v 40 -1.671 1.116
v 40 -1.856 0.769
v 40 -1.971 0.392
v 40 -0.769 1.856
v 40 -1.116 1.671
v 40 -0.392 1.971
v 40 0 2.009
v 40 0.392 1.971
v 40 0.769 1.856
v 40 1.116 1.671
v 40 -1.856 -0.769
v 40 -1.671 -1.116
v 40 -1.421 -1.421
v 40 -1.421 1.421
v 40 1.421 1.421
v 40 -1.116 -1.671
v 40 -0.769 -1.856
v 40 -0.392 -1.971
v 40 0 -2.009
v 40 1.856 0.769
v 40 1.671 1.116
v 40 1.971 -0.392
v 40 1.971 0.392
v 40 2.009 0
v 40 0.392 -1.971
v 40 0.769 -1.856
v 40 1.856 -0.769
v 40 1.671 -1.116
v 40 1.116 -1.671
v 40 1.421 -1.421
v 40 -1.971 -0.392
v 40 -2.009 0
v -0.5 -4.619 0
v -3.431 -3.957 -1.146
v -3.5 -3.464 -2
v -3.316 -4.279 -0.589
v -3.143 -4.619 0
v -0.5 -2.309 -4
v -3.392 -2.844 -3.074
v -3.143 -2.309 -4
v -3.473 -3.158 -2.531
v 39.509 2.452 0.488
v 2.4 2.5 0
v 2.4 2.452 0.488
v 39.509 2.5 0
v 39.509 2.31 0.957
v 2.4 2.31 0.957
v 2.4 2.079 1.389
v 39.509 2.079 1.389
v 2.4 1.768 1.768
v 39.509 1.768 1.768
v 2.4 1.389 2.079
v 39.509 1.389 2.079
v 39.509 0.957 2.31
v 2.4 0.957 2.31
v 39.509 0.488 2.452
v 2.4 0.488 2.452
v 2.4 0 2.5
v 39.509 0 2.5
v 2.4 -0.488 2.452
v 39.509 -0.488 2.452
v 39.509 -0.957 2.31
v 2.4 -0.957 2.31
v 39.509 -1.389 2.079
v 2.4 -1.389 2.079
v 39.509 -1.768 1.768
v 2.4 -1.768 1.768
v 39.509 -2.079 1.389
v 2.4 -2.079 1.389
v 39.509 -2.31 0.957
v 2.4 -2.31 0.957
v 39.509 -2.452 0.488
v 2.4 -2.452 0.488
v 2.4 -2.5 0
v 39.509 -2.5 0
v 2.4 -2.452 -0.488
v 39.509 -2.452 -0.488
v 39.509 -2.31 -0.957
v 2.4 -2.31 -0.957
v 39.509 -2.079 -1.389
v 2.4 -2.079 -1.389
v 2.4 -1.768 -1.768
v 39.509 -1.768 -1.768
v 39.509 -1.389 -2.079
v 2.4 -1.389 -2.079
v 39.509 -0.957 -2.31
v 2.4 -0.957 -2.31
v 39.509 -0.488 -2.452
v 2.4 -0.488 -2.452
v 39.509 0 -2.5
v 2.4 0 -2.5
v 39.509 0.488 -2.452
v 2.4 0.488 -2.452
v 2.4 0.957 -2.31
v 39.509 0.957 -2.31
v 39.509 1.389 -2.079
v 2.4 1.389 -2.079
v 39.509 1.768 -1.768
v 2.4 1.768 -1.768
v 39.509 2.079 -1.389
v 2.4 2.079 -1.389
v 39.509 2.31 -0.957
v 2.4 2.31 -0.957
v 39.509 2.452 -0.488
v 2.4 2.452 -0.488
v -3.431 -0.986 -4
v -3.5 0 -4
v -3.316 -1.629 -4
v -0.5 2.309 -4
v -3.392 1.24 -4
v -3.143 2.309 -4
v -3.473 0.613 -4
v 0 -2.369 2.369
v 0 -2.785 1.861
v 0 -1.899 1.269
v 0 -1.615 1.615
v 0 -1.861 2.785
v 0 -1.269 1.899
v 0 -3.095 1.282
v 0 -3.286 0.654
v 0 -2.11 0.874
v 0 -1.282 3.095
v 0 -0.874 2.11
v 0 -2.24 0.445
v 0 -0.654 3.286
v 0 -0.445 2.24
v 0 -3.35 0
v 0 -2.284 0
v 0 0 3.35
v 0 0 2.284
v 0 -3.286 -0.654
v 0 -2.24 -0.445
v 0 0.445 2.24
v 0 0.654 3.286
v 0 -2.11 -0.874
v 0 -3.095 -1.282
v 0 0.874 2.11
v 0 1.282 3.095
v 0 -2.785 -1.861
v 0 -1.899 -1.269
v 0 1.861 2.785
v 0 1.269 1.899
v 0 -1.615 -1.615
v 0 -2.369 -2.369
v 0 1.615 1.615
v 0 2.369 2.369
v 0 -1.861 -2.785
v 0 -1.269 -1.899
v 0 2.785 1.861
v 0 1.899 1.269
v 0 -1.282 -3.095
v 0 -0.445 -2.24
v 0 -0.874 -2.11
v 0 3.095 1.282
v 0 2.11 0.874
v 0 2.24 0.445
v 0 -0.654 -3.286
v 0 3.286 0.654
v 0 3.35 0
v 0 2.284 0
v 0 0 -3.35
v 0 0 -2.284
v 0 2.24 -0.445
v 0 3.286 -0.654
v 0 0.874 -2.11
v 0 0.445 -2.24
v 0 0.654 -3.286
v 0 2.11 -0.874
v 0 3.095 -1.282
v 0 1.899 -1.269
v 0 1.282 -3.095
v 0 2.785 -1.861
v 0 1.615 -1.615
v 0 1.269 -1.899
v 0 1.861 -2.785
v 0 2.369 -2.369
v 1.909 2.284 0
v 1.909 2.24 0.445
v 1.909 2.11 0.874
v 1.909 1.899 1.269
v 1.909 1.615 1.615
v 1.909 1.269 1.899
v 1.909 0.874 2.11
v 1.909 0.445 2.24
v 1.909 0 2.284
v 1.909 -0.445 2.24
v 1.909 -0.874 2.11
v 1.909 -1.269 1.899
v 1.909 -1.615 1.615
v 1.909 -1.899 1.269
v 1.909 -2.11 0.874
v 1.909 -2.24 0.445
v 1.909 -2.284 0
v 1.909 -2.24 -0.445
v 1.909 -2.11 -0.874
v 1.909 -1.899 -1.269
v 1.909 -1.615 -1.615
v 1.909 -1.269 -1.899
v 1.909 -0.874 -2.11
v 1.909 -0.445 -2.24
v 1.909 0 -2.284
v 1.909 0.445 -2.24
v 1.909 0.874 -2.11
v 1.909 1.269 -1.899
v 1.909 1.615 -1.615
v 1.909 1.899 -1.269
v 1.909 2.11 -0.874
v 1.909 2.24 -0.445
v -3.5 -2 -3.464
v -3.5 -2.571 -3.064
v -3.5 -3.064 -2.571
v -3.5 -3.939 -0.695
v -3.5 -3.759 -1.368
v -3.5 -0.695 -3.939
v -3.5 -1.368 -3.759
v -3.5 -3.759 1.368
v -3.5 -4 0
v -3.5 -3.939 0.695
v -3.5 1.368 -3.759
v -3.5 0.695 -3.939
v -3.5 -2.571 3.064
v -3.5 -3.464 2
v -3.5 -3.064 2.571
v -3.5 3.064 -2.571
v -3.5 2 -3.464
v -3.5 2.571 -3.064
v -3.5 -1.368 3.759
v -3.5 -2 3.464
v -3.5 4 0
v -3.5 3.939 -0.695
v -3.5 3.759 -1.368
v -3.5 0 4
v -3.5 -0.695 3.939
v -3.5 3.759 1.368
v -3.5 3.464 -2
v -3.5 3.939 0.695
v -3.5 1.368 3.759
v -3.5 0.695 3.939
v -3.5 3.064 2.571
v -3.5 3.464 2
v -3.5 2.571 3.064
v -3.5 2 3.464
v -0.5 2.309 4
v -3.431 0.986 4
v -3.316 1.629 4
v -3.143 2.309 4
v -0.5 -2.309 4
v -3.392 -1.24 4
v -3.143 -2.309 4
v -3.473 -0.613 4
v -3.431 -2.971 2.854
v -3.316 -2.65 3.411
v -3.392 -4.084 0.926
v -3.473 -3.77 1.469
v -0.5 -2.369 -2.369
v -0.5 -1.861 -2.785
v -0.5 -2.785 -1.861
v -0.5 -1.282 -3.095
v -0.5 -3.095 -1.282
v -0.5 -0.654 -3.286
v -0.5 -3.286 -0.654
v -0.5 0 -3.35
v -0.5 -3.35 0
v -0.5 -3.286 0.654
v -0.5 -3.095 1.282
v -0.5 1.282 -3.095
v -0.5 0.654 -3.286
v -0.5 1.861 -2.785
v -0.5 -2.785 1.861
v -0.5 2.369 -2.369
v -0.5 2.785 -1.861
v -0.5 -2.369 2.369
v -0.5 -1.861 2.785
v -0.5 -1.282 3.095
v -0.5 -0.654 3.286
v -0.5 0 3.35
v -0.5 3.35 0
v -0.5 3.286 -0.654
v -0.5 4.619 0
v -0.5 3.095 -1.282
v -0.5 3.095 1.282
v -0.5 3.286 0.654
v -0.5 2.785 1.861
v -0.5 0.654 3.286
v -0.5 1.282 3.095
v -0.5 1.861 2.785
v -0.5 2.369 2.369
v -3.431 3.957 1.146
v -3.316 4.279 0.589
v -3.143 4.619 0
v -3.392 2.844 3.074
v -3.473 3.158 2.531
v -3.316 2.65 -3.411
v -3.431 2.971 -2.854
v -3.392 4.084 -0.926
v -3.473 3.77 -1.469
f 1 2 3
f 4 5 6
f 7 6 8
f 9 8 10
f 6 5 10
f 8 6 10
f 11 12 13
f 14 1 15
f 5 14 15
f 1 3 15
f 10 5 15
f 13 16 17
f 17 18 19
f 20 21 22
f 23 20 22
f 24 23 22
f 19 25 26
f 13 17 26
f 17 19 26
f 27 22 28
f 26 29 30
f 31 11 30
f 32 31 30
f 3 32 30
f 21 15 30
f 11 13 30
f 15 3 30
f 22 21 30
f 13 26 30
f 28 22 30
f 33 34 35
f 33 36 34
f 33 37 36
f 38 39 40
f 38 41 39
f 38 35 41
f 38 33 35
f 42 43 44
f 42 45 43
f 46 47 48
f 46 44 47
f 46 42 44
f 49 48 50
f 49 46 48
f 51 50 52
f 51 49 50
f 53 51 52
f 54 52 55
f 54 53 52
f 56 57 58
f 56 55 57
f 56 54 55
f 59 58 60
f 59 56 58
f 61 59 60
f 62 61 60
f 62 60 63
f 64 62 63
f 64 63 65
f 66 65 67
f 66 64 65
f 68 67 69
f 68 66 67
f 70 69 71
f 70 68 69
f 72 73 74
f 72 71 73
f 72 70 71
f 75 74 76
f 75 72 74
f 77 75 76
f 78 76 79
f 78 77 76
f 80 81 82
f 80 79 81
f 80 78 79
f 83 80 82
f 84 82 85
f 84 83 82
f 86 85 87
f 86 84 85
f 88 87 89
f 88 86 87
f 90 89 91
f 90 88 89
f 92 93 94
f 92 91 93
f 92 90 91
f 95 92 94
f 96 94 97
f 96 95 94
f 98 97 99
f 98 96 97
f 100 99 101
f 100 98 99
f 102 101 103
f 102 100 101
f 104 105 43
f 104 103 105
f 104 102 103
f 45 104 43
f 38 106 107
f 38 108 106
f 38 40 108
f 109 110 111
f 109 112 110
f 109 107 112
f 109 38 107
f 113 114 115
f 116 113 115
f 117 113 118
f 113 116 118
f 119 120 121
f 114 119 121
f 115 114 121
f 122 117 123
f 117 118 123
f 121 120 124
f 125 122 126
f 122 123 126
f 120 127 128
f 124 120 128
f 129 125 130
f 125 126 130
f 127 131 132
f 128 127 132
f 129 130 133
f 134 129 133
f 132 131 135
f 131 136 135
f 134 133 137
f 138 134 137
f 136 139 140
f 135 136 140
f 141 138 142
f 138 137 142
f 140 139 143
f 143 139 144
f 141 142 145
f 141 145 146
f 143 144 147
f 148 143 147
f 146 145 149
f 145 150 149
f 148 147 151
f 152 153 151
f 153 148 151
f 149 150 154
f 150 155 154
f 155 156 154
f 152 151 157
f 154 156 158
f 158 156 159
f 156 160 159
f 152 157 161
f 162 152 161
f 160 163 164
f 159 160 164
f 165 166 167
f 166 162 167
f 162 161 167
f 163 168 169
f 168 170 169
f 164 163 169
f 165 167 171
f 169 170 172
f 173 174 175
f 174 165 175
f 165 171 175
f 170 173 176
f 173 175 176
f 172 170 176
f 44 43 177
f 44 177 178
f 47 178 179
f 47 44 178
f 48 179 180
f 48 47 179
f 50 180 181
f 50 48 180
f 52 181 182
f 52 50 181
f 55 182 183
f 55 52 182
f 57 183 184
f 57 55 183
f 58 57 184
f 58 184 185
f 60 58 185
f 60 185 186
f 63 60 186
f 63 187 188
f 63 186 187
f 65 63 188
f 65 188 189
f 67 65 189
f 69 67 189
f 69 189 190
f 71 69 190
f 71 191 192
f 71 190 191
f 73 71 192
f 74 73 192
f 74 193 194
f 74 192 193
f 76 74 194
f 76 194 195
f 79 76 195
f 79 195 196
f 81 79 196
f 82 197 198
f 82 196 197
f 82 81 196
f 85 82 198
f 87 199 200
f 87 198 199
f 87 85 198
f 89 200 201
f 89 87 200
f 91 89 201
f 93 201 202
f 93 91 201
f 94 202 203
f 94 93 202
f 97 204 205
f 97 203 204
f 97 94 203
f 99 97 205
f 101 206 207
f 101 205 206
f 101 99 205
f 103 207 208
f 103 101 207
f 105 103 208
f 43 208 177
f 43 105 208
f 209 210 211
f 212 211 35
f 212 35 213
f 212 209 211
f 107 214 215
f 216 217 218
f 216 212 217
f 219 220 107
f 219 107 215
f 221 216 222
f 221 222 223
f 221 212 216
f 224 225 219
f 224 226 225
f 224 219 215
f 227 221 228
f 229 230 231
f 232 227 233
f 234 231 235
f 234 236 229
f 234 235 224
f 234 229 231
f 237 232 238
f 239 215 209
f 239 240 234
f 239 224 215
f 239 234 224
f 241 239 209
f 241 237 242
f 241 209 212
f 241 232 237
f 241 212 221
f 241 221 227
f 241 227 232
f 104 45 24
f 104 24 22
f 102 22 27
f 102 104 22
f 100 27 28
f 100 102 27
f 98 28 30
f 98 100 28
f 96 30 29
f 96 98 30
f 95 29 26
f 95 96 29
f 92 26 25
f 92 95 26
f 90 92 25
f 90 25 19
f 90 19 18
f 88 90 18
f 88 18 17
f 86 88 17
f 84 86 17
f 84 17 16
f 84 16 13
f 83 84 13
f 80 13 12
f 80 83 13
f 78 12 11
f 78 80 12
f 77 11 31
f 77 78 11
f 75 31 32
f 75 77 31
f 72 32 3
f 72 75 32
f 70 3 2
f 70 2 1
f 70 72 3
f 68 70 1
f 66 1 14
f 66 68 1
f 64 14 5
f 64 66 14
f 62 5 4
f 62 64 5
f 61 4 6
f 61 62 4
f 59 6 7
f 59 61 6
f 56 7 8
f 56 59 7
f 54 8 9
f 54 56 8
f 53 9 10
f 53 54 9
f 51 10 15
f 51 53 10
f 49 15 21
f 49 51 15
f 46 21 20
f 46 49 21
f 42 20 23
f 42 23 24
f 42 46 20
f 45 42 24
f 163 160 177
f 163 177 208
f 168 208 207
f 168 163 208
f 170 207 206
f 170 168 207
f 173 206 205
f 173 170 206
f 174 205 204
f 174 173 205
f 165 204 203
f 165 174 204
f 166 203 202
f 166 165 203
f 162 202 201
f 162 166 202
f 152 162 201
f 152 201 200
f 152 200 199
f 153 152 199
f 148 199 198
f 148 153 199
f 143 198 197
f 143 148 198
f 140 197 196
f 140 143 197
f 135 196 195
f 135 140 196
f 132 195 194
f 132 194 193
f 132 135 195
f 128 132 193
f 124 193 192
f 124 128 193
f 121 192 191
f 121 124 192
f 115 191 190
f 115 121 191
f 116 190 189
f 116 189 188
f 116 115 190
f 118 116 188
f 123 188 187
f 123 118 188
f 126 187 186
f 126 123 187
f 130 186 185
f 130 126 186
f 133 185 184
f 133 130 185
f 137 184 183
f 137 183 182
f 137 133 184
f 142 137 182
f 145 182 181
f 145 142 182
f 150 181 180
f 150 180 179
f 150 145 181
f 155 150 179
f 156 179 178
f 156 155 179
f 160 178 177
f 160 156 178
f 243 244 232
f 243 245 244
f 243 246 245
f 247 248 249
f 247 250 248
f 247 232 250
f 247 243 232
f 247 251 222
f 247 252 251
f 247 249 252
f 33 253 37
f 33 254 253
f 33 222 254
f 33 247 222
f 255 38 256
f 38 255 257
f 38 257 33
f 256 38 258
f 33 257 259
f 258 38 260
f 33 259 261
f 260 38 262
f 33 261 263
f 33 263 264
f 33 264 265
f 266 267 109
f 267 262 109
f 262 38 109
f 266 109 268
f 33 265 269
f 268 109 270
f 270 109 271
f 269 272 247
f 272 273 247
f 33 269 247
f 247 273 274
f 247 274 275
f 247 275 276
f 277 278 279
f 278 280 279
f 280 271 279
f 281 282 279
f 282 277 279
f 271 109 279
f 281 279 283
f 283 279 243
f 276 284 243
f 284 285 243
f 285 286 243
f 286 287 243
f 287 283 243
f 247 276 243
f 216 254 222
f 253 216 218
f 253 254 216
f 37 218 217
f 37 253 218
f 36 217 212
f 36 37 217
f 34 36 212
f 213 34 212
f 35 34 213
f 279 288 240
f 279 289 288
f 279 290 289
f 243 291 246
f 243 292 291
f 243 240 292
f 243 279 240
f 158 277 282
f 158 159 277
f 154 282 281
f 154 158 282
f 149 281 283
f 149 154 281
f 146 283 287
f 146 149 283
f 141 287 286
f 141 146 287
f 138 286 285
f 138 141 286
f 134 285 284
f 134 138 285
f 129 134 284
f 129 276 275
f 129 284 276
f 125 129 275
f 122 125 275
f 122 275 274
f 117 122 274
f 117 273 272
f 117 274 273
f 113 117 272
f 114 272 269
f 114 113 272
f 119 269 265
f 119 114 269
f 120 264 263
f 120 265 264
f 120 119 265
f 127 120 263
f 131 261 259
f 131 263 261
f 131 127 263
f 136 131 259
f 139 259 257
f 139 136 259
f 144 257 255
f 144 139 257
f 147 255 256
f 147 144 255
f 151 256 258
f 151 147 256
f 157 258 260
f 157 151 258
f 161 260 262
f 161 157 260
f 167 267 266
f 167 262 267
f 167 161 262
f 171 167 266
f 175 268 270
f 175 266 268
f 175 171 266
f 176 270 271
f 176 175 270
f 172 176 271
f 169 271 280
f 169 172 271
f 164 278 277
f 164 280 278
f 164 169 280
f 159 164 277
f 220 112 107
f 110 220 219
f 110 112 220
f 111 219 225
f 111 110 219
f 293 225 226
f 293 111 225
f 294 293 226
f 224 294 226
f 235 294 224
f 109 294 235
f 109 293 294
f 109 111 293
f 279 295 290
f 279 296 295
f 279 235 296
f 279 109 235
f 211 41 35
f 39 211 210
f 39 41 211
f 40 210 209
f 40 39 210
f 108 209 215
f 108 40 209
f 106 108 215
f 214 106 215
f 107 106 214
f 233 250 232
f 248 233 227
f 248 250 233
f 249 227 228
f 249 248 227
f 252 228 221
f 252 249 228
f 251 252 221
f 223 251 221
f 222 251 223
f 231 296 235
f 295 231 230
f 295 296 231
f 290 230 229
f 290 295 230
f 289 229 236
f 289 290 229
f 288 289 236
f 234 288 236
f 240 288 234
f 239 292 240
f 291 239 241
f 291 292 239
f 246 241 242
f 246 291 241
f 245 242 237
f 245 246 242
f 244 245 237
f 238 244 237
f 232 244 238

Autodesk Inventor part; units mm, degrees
ref_plane "YZ Plane" through (0, 0, 0) normal (1, 0, 0) x (0, 1, 0)
ref_plane "XZ Plane" through (0, 0, 0) normal (0, 1, 0) x (-1, 0, 0)
sketch "Sketch1" plane through (0, 0, 0) normal (0, 0, 1) x (1, 0, 0)
  line L0 (0, 3.35) -> (0, 2.2835)
  line L1 (2.4, 2.5) -> (40, 2.5)
  line L2 (40, 2.5) -> (40, 0)
  line L3 (40, 0) -> (-0.5001, 0)
  line L4 (-8.6001, 0) -> (48.1, 0) projected
  line L5 (-0.5001, 0) -> (-0.5001, 3.35)
  line L6 (-0.5001, 3.35) -> (0, 3.35)
  line L7 (2.4, 2.5) -> (1.9091, 2.2835)
  line L8 (1.9091, 2.2835) -> (0, 2.2835)
  line L9 (0, -0.67) -> (0, 4.02) projected
  dimension "d0" = 40
  dimension "d1" = 37.6
  dimension "d2" = 5
  dimension "d9" = 0.5001
  dimension "d10" = 6.7
  dimension "d13" = 0.4909
  dimension "d14" = 4.567
revolve "Body" add sketch "Sketch1" angle 360 about axis through (40, 0, 0) along (-1, 0, 0)
sketch "Sketch2" plane through (-0.5001, 0, 0) normal (-1, 0, 0) x (0, 0, 1)
  line L0 (0, 4.6188) -> (4, 2.3094)
  line L1 (4, 2.3094) -> (4, -2.3094)
  line L2 (4, -2.3094) -> (0, -4.6188)
  line L3 (0, -4.6188) -> (-4, -2.3094)
  line L4 (-4, -2.3094) -> (-4, 2.3094)
  line L5 (-4, 2.3094) -> (0, 4.6188)
  point P0 (0, 0)
  point P1 (0, 0)
  dimension "d11" = 8
extrude "Head" add sketch "Sketch2" along normal blind 3
sketch "Sketch4" plane through (0, 0, 0) normal (0, 0, 1) x (1, 0, 0)
  line L0 (-3.5001, 4) -> (-3.5001, 4.6188)
  line L1 (-3.5001, 4.6188) -> (-3.1428, 4.6188)
  line L2 (-3.1428, 4.6188) -> (-3.5001, 4)
  line L3 (-4.1001, 0) -> (0.0999, 0) projected
  line L4 (-0.5001, 4.6188) -> (-3.5001, 4.6188) projected
  line L5 (-3.5001, 2.3094) -> (-3.5001, 4.6188) projected
  dimension "d5" = 30
  dimension "d19" = 8
revolve "Chamfer1" cut sketch "Sketch4" angle 360 about axis through (-10, 0, 0) along (1, 0, 0)
thread "Thread" size "M5x0.8" class "6g" standard "ISO Metric profile" length 37.6
chamfer "Chamfer2" distance 0.4908 distance2 0.4909 1 edges at (40, -2.5, 0) measured on face at (40, 0.1004, 0.4284)
ref_plane "Work Plane1" through (1.525, 0, 0) normal (0, 0, 1) x (1, 0, 0)
equation "\"d0\" = NLG"
equation "\"d1\" = GEL"
equation "\"d2\" = GD"
equation "\"d10\" = SD2"
equation "\"d14\" = BDM"
equation "\"d11\" = SW"
equation "\"d3\" = KOH - SD"
equation "\"d5\" = ANG1"
equation "\"d19\" = SW0"
equation "\"d15\" = GEL"
equation "\"d6\" = -0.5 * SPD + 0.5 * GD"
equation "\"NLG\" = 40"
equation "\"GD\" = NND"
equation "\"BDM\" = 4.56699"
equation "\"KOH\" = 3.5"
equation "\"GEL\" = 37.6"
equation "\"SW\" = 8"
equation "\"SW0\" = 8"
equation "\"SPD\" = NND - 1.2269 * PTC"
equation "\"SD2\" = 6.7"
equation "\"SD\" = 0.5"
equation "\"ANG1\" = 30deg"
equation "\"GAL\" = 0.61345 * PTC"
equation "\"GUL\" = 0.61345 * PTC"
equation "\"RR\" = 0.2"
equation "\"GD1\" = THREADDIA - 1.2269 * PTC"
equation "\"THREADDIA\" = 5"
equation "\"TOA\" = 30deg"
equation "\"PTC\" = 0.8"
equation "\"NND\" = 5"
equation "\"E0\" = 1.155 * SW"
properties part number "DIN 933 - M5  x 40" material "Steel, Mild"
